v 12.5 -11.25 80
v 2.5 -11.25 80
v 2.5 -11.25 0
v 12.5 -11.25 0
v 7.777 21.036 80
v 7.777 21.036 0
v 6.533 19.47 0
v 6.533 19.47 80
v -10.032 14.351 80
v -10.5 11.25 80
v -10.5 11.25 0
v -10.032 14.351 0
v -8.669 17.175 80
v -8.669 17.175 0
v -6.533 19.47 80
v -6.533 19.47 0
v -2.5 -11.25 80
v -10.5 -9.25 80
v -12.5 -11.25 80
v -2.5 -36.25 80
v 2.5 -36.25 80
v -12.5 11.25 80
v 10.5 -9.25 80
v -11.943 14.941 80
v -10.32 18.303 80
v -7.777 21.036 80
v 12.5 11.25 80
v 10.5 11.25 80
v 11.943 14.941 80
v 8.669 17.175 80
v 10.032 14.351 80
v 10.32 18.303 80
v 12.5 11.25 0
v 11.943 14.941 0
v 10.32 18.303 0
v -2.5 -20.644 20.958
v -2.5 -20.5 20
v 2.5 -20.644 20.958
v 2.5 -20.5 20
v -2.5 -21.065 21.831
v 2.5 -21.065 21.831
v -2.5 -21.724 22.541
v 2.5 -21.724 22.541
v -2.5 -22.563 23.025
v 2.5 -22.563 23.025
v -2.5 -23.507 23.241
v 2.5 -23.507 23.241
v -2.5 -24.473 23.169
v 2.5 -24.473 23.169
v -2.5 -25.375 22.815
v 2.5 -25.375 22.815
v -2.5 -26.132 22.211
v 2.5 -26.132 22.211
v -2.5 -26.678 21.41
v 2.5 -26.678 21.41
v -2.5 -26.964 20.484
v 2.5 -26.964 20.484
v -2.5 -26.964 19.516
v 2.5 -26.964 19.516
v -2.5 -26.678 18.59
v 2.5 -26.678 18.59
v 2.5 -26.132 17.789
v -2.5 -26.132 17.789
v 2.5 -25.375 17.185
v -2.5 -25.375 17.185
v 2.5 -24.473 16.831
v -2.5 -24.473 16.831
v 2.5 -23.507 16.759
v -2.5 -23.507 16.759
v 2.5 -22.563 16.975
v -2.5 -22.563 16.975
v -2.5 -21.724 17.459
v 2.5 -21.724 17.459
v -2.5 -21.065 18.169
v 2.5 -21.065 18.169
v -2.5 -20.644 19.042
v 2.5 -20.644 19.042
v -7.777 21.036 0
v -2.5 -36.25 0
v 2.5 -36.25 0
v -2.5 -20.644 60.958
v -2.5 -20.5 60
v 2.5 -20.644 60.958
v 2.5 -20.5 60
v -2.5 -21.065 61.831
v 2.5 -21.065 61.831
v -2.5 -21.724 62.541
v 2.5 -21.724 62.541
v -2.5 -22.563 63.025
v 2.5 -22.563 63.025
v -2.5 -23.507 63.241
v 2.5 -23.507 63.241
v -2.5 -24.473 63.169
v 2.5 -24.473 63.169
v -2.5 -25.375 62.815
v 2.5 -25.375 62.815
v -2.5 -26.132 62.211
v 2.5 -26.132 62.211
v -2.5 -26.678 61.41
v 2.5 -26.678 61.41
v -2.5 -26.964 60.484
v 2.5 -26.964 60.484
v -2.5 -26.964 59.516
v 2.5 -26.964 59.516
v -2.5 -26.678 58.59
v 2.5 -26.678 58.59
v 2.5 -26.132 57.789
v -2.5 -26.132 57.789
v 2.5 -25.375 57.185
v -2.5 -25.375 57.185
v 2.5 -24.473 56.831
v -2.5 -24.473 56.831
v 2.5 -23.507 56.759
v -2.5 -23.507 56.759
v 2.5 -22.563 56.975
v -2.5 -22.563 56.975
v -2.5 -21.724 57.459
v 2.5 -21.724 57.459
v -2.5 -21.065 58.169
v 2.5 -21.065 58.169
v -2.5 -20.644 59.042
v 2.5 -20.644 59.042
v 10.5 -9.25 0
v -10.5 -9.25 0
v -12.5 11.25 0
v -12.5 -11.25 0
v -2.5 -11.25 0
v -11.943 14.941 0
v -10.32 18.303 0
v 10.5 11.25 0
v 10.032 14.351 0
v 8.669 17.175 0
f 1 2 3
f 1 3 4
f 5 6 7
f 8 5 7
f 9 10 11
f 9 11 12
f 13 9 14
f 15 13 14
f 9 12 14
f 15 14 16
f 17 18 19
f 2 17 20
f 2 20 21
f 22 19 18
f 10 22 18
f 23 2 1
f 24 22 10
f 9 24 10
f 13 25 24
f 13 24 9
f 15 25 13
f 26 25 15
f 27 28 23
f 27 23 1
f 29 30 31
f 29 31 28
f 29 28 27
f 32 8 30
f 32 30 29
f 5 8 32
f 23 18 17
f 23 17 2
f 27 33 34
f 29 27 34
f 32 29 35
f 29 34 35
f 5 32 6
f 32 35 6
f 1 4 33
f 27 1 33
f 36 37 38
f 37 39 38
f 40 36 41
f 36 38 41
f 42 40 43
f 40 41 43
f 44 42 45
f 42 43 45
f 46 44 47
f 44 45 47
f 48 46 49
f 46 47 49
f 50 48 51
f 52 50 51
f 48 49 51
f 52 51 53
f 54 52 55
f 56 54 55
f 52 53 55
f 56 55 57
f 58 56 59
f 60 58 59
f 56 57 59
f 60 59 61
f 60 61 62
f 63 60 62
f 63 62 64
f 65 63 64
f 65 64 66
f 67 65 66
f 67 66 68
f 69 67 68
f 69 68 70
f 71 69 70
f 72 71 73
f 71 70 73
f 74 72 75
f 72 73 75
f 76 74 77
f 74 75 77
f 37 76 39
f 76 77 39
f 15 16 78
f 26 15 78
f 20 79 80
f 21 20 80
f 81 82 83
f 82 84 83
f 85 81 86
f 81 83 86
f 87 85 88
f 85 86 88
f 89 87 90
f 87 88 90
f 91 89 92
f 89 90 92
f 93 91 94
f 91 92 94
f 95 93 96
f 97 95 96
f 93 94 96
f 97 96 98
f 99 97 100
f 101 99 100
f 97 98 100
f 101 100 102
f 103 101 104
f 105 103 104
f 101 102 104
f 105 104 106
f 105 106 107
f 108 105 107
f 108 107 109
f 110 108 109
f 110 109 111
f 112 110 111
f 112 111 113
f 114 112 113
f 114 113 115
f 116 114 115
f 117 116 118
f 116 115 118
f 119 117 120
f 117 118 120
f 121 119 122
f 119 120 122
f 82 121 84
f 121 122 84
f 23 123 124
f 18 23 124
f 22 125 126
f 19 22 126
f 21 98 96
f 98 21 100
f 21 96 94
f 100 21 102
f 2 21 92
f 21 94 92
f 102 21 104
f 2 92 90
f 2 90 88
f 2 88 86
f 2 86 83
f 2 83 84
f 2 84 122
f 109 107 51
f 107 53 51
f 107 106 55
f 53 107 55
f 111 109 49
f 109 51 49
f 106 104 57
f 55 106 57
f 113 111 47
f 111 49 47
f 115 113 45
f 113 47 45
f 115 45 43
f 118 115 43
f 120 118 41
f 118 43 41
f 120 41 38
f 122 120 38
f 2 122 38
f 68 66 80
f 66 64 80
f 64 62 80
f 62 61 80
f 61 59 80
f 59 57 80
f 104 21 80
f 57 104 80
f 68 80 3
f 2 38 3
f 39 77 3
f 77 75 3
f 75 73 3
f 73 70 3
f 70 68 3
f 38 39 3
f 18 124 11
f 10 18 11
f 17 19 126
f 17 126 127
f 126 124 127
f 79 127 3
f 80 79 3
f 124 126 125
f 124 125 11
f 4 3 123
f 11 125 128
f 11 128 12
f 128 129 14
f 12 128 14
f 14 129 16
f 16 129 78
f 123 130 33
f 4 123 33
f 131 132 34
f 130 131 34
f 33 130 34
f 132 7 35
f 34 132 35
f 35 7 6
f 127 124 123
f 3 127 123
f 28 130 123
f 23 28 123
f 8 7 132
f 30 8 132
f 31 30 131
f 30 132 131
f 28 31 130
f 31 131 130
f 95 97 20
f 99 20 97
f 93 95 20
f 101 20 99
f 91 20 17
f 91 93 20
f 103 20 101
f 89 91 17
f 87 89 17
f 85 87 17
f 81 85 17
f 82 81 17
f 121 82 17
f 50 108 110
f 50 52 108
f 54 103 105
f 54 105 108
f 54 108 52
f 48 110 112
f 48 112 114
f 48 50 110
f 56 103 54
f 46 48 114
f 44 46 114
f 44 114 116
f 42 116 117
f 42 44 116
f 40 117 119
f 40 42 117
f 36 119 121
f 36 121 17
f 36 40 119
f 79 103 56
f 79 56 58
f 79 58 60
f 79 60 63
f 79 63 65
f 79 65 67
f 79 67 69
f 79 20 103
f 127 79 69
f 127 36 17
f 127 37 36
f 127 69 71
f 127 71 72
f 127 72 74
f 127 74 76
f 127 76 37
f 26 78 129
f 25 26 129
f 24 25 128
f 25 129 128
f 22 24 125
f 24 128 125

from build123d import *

# Parameters (mm, degrees)
F2_DEPTH      = 80
F1_W          = 5
F1_H          = 25
F3_DEPTH      = 80
F4_R          = 3.25
F5_DEPTH      = 25
F5_DEPTH_BACK = 25


with BuildPart() as f2:
    # F0 (on Top) → F2 (new body)
    with BuildSketch(Plane.XY):
        with BuildLine():
            Line((-12.5, -11.25), (12.5, -11.25))
            Line((12.5, -11.25), (12.5, 11.25))
            ThreePointArc((12.5, 11.25), (11.2575846496, 16.6829354732), (7.777313943, 21.0358769577))
            Line((7.777313943, 21.0358769577), (6.5329437122, 19.4701366445))
            ThreePointArc((6.5329437122, 19.4701366445), (9.4563711057, 15.8136657975), (10.5, 11.25))
            Line((10.5, 11.25), (10.5, -9.25))
            Line((10.5, -9.25), (-10.5, -9.25))
            Line((-10.5, -9.25), (-10.5, 11.25))
            ThreePointArc((-10.5, 11.25), (-9.4563711057, 15.8136657975), (-6.5329437122, 19.4701366445))
            Line((-6.5329437122, 19.4701366445), (-7.777313943, 21.0358769577))
            ThreePointArc((-7.777313943, 21.0358769577), (-11.2575846496, 16.6829354732), (-12.5, 11.25))
            Line((-12.5, 11.25), (-12.5, -11.25))
        make_face()
    extrude(amount=F2_DEPTH)

    # F1 (on Top) → F3 (join)
    with BuildSketch(Plane.XY):
        with Locations((0, -23.75)):
            Rectangle(F1_W, F1_H)
    extrude(amount=F3_DEPTH)

    # F4 (on Right) → F5 (cut, two sides)
    with BuildSketch(Plane.YZ) as f5_sk:
        with Locations((-23.75, 20)):
            Circle(F4_R)
        with Locations((-23.75, 60)):
            Circle(F4_R)
    extrude(amount=-F5_DEPTH, mode=Mode.SUBTRACT)
    extrude(f5_sk.sketch, amount=F5_DEPTH_BACK, mode=Mode.SUBTRACT)


solid = f2.part
